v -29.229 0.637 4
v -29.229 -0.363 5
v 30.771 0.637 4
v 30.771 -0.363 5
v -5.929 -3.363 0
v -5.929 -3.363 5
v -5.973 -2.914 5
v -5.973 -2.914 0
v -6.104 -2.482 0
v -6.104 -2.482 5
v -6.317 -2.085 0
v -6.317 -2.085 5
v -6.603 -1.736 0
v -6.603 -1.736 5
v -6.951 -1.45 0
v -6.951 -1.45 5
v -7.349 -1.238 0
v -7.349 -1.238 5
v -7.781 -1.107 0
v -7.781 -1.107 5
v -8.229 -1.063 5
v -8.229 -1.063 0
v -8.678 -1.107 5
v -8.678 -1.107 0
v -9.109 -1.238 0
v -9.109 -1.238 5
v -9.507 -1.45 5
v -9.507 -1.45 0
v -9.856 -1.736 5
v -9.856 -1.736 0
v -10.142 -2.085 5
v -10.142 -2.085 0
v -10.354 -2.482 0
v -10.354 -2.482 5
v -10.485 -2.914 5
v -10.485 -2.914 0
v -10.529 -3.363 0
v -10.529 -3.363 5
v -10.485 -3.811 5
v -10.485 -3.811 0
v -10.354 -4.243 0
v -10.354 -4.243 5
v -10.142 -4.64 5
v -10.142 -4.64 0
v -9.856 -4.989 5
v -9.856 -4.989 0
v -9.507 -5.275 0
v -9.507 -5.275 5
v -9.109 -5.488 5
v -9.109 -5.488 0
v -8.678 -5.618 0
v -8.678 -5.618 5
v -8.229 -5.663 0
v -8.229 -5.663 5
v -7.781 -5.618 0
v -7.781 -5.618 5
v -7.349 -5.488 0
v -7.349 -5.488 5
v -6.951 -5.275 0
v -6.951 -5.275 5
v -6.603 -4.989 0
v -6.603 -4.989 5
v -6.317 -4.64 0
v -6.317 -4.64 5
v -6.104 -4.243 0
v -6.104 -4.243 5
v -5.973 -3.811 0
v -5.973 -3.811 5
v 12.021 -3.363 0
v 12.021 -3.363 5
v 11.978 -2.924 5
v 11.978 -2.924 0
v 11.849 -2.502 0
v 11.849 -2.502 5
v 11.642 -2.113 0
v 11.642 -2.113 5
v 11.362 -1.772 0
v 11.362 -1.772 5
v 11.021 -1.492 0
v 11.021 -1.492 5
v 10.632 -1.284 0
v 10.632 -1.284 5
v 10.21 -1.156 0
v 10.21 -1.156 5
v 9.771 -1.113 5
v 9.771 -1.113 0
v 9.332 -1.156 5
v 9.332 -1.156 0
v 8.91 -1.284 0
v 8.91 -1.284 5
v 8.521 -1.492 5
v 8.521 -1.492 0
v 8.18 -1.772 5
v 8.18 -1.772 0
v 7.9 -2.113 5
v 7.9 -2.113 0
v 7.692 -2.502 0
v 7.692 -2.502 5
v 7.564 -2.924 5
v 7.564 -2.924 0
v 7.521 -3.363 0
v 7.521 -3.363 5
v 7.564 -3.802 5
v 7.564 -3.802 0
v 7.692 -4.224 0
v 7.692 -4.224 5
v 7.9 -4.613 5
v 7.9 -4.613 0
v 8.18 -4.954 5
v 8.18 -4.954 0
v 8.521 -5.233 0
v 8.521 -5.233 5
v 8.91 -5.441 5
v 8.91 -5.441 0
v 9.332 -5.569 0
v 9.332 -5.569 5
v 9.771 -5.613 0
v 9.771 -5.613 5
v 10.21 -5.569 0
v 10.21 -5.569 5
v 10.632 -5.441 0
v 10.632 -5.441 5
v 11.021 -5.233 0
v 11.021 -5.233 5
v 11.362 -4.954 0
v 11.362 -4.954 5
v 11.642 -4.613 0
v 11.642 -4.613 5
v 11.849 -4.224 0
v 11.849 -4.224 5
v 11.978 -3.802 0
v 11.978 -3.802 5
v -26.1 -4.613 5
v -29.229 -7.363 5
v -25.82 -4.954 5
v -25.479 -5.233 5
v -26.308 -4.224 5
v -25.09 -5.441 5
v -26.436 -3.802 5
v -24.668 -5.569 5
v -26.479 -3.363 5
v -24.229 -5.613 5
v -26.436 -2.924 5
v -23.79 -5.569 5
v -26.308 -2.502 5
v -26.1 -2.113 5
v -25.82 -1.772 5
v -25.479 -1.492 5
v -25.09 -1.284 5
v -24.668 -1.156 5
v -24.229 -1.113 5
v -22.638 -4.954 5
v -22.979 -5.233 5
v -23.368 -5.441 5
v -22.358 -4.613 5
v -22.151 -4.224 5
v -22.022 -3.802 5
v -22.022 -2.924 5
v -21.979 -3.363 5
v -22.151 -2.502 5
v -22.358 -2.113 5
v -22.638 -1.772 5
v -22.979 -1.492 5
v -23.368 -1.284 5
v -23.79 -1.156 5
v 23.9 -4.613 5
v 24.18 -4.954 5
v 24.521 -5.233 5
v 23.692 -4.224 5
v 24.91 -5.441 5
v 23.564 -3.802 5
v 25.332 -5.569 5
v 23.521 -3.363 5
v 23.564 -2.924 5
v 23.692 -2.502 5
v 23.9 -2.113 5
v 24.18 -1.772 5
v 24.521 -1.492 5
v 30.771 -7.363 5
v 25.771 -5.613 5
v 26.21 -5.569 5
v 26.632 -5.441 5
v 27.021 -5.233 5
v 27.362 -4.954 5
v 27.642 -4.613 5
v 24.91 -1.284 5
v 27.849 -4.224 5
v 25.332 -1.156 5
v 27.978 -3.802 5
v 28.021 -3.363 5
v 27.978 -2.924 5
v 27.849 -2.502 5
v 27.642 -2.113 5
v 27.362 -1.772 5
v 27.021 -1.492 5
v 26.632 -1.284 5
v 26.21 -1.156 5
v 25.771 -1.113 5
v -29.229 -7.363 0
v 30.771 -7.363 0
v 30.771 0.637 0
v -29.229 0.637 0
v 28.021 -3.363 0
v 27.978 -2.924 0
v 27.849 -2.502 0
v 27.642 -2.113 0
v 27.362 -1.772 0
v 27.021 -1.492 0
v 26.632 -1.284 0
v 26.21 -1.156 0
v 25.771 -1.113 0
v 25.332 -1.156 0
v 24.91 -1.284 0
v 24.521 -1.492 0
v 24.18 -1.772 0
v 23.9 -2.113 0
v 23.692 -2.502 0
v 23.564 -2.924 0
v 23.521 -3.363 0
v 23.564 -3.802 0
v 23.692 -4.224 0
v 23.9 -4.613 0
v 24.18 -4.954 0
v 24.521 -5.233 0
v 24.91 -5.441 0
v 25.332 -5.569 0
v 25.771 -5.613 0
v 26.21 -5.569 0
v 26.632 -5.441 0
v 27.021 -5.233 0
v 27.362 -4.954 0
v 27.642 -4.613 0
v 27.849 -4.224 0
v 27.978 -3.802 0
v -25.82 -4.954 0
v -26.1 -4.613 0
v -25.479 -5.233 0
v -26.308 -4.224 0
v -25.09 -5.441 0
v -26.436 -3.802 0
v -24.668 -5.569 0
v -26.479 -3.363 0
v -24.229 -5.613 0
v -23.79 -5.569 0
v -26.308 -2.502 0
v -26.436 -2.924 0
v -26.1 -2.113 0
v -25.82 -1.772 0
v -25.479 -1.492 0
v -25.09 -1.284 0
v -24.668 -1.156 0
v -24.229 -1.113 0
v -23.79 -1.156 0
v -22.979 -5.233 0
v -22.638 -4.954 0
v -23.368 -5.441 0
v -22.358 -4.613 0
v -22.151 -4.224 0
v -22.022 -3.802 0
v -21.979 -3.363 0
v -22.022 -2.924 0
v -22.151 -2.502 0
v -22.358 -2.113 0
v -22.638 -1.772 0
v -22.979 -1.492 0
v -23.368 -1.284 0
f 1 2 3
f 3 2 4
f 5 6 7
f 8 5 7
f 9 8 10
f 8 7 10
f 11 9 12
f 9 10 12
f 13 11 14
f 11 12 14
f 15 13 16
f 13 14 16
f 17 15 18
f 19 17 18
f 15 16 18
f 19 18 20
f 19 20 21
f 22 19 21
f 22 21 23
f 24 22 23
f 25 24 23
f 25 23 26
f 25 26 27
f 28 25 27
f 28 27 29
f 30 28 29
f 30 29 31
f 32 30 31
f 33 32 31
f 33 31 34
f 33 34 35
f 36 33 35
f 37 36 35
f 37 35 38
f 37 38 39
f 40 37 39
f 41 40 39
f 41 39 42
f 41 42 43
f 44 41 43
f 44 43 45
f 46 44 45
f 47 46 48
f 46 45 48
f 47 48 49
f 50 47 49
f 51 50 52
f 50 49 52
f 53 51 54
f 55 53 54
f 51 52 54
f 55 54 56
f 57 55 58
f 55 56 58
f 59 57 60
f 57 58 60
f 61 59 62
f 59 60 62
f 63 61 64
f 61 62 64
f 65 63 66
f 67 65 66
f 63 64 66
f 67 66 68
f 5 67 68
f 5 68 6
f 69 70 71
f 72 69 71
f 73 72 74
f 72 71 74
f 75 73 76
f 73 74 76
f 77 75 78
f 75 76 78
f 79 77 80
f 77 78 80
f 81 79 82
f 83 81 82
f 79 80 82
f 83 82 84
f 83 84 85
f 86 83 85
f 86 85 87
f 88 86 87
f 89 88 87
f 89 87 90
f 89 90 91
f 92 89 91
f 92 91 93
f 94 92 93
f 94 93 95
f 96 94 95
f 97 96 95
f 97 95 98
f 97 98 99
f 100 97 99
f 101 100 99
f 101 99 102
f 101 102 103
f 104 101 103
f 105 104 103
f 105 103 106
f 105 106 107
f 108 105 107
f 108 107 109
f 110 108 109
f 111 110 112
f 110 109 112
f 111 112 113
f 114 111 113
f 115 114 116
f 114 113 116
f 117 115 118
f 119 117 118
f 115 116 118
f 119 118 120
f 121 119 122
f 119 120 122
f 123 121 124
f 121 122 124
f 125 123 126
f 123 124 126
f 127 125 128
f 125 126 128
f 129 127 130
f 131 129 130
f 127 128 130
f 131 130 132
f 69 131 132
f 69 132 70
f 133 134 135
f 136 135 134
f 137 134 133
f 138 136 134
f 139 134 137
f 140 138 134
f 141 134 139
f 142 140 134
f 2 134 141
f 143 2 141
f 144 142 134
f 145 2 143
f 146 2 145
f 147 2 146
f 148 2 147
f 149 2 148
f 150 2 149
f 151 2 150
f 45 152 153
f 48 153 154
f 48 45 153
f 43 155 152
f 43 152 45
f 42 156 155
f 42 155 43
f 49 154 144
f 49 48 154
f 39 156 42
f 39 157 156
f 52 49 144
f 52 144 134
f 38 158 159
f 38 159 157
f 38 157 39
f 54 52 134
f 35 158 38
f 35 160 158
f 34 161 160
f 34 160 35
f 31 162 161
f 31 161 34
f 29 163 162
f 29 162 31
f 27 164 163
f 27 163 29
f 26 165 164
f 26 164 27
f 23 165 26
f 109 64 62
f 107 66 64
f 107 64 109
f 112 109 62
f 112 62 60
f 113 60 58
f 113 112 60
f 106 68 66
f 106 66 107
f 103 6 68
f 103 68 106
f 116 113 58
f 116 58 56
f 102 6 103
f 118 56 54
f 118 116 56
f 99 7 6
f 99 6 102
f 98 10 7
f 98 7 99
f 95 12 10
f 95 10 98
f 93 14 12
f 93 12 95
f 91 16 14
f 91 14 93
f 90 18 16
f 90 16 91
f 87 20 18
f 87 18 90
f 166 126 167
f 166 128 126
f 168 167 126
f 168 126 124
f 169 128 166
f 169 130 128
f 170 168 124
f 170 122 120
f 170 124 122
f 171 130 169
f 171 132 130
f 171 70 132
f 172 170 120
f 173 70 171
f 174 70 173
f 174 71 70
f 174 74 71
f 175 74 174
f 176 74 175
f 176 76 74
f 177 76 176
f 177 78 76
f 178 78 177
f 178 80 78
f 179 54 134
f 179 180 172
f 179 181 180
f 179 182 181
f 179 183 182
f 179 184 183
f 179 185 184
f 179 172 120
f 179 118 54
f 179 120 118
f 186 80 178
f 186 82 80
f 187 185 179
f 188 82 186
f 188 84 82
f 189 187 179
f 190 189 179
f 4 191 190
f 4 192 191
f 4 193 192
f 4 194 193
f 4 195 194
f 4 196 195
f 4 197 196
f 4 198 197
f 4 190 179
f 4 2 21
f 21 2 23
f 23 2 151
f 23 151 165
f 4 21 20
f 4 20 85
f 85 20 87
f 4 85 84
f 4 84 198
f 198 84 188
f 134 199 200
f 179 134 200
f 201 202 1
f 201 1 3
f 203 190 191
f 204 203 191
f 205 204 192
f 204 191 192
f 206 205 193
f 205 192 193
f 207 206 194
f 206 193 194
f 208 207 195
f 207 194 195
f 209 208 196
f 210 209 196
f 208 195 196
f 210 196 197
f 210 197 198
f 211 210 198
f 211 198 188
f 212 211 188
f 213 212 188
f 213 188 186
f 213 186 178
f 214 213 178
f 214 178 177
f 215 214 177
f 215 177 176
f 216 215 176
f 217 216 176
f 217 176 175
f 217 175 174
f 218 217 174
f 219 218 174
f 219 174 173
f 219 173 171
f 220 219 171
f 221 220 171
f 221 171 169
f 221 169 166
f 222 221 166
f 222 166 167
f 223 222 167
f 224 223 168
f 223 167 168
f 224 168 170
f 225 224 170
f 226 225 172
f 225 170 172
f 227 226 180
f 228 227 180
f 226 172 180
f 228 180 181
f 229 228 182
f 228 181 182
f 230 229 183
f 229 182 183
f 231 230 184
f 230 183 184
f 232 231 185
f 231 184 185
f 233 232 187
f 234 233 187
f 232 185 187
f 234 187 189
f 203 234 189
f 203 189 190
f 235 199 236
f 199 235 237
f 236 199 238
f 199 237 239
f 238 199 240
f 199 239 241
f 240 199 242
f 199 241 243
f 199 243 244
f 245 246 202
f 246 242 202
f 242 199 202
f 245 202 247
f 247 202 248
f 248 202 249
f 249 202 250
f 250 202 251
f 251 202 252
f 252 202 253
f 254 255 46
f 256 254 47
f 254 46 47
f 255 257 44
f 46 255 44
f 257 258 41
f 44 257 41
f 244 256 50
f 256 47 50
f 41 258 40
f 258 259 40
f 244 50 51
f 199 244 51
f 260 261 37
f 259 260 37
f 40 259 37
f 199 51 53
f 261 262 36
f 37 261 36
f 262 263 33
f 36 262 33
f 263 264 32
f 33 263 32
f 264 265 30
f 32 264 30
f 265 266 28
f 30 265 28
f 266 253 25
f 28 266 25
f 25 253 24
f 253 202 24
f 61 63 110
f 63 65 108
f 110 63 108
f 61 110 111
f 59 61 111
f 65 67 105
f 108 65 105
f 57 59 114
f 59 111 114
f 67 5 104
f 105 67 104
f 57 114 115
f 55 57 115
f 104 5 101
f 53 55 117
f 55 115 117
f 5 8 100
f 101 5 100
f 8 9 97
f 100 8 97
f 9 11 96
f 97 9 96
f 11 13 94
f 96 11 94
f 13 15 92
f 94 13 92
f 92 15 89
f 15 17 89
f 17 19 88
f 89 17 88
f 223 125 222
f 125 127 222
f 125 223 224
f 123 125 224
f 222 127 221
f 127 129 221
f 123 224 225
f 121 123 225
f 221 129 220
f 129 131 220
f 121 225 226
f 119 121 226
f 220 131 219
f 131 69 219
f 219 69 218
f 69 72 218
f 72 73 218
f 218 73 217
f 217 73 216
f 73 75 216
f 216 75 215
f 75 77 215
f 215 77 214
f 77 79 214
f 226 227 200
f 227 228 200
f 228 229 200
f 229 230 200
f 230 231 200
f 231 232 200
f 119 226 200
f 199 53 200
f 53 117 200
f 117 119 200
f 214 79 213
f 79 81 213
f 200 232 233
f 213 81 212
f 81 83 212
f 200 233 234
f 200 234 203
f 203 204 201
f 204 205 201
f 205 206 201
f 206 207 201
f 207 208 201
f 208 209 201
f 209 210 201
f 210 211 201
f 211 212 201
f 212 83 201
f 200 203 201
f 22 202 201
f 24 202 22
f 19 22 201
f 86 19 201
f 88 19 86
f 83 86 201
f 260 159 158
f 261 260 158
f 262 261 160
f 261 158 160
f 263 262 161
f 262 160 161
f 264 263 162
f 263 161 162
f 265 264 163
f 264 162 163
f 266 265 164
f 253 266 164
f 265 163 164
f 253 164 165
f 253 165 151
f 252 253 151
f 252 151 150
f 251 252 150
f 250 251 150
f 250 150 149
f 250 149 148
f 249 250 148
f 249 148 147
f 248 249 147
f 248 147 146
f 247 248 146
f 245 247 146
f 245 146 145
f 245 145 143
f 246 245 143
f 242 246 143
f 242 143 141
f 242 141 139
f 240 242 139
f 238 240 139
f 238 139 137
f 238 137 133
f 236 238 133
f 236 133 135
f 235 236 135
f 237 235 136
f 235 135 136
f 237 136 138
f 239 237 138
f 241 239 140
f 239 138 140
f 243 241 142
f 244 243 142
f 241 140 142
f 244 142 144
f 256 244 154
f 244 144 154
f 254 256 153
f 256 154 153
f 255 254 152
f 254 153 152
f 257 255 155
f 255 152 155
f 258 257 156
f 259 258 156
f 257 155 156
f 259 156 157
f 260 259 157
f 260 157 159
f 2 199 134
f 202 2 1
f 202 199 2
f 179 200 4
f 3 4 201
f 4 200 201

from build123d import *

# Parameters (mm, degrees)
F0_W     = 60
F0_H     = 8
F1_DEPTH = 5
F2_R     = 2.3
F2_R_2   = 2.25
F3_DEPTH = 5.001
F4_SIZE  = 1


with BuildPart() as f1:
    # F0 (on Top) → F1 (new body)
    with BuildSketch(Plane.XY):
        with Locations((0.770761, -3.362608)):
            Rectangle(F0_W, F0_H)
    extrude(amount=F1_DEPTH)

    # F2 (on face) → F3 (cut, through all)
    with BuildSketch(Plane.XY.offset(5)):
        with Locations((-8.229239, -3.362608)):
            Circle(F2_R)
        with Locations((9.770761, -3.362608)):
            Circle(F2_R_2)
        with Locations((25.770761, -3.362608)):
            Circle(F2_R_2)
        with Locations((-24.229239, -3.362608)):
            Circle(F2_R_2)
    extrude(amount=-F3_DEPTH, mode=Mode.SUBTRACT)

    # F4
    f4_edges = [f1.edges().sort_by_distance(p)[0] for p in [
        (0.770761, 0.637392, 5),
    ]]
    chamfer(f4_edges, length=F4_SIZE)


solid = f1.part
